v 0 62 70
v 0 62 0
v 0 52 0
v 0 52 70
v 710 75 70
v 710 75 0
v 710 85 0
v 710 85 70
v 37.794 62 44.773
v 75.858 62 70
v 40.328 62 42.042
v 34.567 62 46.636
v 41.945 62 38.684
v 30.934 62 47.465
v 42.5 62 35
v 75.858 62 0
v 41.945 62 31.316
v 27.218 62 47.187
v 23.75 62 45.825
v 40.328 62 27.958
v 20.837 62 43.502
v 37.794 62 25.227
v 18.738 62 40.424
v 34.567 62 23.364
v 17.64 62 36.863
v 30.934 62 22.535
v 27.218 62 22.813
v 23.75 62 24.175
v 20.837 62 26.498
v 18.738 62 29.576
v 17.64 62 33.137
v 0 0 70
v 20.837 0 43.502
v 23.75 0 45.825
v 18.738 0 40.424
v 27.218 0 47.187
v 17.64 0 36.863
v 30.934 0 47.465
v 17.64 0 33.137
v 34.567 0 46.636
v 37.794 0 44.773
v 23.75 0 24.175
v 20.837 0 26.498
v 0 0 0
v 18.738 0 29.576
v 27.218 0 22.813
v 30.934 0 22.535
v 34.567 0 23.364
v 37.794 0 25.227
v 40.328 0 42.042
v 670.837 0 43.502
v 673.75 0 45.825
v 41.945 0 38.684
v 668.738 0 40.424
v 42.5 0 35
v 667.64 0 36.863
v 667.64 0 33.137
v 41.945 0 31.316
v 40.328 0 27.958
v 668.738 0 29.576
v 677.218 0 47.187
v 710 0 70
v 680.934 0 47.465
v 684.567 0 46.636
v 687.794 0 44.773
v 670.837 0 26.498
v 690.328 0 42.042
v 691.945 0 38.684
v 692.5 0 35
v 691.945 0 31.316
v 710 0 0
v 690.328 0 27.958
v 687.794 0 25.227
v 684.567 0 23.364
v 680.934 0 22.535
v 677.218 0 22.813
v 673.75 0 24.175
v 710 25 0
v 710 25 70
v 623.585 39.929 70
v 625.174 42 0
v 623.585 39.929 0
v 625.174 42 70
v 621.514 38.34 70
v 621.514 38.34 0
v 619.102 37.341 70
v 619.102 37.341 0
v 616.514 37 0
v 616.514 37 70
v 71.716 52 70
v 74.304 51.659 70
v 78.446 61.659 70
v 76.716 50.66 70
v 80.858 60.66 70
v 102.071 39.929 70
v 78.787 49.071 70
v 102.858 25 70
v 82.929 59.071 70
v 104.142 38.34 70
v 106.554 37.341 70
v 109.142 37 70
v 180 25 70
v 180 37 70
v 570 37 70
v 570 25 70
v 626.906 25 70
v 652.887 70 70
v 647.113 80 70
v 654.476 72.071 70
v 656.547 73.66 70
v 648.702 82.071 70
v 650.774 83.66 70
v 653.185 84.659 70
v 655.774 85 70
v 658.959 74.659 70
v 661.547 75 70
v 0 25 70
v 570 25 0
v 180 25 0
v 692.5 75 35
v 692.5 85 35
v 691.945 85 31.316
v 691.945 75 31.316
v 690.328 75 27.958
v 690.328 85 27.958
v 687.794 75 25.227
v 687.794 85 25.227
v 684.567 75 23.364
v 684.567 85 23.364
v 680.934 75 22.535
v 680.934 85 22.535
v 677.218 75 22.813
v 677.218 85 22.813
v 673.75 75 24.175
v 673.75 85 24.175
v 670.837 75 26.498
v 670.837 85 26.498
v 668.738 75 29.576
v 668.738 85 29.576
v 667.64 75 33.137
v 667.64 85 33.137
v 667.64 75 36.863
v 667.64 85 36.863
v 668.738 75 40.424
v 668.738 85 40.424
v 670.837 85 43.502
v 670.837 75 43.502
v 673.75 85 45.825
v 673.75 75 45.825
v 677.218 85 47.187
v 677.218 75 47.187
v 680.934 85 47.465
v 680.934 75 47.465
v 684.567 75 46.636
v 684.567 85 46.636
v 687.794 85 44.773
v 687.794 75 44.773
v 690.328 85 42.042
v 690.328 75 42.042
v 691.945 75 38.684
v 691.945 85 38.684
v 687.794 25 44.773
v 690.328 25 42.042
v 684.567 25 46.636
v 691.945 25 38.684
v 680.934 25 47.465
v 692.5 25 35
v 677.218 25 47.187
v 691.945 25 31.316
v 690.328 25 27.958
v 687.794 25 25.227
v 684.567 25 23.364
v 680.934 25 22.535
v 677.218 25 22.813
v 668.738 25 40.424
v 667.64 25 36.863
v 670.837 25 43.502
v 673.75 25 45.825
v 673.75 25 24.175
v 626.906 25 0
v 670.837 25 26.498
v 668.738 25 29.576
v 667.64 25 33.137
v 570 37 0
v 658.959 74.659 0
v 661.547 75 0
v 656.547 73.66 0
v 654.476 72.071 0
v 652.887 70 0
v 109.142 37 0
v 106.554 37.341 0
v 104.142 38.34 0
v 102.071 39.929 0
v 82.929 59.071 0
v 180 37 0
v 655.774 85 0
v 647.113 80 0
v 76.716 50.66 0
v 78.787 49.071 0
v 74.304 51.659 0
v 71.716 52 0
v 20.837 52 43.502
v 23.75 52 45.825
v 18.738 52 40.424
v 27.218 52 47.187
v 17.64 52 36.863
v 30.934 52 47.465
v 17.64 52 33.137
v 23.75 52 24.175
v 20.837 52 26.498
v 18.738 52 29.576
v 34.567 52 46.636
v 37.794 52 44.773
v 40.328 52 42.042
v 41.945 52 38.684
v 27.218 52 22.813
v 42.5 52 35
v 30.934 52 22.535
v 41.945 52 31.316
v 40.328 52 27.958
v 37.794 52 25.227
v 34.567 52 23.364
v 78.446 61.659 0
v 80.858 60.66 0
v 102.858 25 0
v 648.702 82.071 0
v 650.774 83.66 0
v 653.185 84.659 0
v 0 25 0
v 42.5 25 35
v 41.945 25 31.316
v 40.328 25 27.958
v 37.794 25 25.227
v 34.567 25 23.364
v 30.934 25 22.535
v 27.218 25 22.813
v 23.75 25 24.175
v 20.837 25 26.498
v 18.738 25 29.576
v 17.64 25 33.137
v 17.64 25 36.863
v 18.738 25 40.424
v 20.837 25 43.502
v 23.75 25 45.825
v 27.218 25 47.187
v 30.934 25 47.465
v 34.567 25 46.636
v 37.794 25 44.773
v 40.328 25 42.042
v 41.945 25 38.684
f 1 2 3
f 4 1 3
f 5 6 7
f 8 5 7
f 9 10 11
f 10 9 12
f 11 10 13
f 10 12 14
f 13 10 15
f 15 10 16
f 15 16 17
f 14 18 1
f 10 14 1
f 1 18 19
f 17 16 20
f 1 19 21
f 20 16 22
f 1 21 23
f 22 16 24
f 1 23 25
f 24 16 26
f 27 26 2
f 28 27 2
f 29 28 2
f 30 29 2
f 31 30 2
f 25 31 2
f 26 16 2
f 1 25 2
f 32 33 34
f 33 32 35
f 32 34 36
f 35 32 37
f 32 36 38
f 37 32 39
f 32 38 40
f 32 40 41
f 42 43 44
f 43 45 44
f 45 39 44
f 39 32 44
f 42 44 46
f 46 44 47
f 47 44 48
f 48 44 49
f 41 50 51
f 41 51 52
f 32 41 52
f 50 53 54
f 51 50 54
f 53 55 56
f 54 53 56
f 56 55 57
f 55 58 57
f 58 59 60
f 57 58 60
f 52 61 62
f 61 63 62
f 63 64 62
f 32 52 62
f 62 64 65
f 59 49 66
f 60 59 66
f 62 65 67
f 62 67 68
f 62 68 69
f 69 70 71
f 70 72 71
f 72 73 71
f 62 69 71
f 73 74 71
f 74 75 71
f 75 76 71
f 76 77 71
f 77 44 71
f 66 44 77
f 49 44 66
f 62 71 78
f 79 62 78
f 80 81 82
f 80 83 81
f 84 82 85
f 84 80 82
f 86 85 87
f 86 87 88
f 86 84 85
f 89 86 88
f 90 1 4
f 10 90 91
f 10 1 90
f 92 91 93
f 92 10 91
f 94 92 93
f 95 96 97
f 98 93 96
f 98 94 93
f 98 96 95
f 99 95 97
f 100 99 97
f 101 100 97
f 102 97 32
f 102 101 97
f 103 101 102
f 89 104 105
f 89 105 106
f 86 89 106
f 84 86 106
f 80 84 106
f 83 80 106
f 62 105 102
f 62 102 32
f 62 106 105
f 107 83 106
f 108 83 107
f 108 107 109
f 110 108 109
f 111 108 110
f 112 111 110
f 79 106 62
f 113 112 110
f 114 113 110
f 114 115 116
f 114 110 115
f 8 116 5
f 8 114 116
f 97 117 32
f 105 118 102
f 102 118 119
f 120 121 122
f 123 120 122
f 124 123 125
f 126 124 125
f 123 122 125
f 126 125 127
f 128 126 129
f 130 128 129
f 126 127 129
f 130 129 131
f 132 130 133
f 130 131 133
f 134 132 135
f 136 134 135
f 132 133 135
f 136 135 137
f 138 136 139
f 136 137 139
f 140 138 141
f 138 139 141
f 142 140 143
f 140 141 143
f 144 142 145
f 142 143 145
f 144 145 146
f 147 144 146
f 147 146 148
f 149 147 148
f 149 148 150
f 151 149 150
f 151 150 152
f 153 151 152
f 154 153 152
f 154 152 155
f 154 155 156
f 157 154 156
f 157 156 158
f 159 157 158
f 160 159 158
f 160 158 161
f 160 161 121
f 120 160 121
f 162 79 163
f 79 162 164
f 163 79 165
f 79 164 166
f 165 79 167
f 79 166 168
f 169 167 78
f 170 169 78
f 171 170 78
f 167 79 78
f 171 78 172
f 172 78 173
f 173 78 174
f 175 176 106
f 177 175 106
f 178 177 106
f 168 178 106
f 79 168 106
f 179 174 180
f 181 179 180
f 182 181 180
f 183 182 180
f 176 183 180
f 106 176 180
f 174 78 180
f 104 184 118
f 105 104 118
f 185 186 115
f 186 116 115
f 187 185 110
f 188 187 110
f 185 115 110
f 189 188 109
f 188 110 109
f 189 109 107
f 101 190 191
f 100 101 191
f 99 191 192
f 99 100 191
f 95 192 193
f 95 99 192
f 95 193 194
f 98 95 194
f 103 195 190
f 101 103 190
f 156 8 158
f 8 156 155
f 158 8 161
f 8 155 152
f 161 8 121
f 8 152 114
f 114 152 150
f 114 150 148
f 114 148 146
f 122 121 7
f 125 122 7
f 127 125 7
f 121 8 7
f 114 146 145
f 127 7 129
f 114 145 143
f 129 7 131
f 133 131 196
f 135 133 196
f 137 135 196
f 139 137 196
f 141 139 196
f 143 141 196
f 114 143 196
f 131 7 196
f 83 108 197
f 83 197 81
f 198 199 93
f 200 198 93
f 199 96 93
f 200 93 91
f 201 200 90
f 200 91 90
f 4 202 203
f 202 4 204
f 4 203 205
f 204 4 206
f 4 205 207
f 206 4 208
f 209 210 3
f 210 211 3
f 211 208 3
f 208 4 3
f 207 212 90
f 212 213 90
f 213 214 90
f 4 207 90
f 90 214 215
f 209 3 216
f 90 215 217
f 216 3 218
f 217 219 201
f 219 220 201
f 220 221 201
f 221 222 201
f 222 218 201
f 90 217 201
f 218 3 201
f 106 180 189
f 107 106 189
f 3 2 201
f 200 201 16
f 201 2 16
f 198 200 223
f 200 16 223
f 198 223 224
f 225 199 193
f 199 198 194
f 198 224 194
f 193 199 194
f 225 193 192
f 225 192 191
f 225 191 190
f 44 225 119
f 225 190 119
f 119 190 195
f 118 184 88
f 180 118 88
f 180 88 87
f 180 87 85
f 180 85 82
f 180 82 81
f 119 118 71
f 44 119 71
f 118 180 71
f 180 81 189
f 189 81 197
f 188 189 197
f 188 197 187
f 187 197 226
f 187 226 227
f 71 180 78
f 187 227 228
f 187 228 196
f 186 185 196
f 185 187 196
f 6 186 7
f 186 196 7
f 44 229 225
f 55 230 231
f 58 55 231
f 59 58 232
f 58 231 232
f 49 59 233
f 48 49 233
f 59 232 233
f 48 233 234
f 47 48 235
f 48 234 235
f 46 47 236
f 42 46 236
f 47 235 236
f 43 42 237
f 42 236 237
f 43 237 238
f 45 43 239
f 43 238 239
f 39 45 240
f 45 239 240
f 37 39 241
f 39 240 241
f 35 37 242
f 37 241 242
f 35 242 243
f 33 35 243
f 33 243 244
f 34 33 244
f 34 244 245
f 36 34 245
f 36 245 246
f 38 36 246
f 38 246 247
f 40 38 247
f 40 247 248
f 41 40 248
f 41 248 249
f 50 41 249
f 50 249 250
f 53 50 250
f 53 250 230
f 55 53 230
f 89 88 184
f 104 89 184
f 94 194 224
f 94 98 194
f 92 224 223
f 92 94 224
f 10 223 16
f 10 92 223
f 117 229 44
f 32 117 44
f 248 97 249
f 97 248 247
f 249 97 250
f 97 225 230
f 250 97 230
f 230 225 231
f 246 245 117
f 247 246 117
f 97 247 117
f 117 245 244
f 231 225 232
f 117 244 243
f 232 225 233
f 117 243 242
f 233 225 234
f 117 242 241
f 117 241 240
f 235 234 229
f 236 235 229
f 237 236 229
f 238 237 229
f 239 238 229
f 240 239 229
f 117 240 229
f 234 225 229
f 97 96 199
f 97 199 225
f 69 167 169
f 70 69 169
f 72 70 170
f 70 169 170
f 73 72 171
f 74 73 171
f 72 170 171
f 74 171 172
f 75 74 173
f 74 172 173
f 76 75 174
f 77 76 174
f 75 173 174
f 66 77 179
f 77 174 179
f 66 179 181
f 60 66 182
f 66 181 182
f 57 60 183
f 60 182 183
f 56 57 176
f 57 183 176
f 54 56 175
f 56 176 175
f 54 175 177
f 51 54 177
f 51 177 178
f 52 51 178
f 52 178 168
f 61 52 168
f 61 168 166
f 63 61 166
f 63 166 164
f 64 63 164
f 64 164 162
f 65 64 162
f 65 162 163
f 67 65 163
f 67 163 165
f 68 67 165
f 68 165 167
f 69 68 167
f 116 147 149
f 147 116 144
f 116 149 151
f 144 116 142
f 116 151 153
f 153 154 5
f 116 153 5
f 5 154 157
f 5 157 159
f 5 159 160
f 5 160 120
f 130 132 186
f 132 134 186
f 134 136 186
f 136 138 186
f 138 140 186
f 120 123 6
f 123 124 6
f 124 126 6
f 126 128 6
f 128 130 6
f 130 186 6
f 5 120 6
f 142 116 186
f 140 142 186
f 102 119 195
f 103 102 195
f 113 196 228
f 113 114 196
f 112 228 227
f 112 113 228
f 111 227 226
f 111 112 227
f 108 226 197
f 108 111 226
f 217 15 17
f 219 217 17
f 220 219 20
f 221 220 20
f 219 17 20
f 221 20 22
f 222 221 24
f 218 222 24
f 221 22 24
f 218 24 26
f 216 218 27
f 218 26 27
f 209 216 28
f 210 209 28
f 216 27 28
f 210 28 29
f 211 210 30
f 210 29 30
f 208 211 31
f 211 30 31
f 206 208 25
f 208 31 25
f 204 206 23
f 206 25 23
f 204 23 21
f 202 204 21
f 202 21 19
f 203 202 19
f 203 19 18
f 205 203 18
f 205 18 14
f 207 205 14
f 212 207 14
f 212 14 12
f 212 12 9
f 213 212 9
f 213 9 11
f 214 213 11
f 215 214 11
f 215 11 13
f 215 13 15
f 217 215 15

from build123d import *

# Parameters (mm, degrees)
BOSS_EXTRUDE1_DEPTH = 70
FILLET1_R           = 10
FILLET2_R           = 10
SKETCH2_R           = 12.5
CUT_EXTRUDE1_DEPTH  = 86


with BuildPart() as part:
    # Sketch1 → Boss-Extrude1 (new body)
    with BuildSketch(Plane.XY):
        Polygon((0, 62), (0, 52), (75.857864376, 52), (102.857864376, 25), (0, 25), (0, 0), (710, 0), (710, 25), (626.905989232, 25), (655.773502692, 75), (710, 75), (710, 85), (650, 85), (622.287187079, 37), (570, 37), (570, 25), (180, 25), (180, 37), (105, 37), (80, 62), align=None)
    extrude(amount=BOSS_EXTRUDE1_DEPTH)

    # Fillet1
    fillet1_edges = [part.edges().sort_by_distance(p)[0] for p in [
        (80, 62, 35),
        (105, 37, 35),
        (650, 85, 35),
        (622.287187079, 37, 35),
    ]]
    fillet(fillet1_edges, radius=FILLET1_R)

    # Fillet2
    fillet2_edges = [part.edges().sort_by_distance(p)[0] for p in [
        (75.857864376, 52, 35),
        (655.773502692, 75, 35),
    ]]
    fillet(fillet2_edges, radius=FILLET2_R)

    # Sketch2 → Cut-Extrude1 (cut, through all)
    with BuildSketch(Plane(origin=(0, 85, 0), x_dir=(1, 0, 0), z_dir=(0, 1, 0))):
        with Locations((680, -35)):
            Circle(SKETCH2_R)
        with Locations((30, -35)):
            Circle(SKETCH2_R)
    extrude(amount=-CUT_EXTRUDE1_DEPTH, mode=Mode.SUBTRACT)


solid = part.part
